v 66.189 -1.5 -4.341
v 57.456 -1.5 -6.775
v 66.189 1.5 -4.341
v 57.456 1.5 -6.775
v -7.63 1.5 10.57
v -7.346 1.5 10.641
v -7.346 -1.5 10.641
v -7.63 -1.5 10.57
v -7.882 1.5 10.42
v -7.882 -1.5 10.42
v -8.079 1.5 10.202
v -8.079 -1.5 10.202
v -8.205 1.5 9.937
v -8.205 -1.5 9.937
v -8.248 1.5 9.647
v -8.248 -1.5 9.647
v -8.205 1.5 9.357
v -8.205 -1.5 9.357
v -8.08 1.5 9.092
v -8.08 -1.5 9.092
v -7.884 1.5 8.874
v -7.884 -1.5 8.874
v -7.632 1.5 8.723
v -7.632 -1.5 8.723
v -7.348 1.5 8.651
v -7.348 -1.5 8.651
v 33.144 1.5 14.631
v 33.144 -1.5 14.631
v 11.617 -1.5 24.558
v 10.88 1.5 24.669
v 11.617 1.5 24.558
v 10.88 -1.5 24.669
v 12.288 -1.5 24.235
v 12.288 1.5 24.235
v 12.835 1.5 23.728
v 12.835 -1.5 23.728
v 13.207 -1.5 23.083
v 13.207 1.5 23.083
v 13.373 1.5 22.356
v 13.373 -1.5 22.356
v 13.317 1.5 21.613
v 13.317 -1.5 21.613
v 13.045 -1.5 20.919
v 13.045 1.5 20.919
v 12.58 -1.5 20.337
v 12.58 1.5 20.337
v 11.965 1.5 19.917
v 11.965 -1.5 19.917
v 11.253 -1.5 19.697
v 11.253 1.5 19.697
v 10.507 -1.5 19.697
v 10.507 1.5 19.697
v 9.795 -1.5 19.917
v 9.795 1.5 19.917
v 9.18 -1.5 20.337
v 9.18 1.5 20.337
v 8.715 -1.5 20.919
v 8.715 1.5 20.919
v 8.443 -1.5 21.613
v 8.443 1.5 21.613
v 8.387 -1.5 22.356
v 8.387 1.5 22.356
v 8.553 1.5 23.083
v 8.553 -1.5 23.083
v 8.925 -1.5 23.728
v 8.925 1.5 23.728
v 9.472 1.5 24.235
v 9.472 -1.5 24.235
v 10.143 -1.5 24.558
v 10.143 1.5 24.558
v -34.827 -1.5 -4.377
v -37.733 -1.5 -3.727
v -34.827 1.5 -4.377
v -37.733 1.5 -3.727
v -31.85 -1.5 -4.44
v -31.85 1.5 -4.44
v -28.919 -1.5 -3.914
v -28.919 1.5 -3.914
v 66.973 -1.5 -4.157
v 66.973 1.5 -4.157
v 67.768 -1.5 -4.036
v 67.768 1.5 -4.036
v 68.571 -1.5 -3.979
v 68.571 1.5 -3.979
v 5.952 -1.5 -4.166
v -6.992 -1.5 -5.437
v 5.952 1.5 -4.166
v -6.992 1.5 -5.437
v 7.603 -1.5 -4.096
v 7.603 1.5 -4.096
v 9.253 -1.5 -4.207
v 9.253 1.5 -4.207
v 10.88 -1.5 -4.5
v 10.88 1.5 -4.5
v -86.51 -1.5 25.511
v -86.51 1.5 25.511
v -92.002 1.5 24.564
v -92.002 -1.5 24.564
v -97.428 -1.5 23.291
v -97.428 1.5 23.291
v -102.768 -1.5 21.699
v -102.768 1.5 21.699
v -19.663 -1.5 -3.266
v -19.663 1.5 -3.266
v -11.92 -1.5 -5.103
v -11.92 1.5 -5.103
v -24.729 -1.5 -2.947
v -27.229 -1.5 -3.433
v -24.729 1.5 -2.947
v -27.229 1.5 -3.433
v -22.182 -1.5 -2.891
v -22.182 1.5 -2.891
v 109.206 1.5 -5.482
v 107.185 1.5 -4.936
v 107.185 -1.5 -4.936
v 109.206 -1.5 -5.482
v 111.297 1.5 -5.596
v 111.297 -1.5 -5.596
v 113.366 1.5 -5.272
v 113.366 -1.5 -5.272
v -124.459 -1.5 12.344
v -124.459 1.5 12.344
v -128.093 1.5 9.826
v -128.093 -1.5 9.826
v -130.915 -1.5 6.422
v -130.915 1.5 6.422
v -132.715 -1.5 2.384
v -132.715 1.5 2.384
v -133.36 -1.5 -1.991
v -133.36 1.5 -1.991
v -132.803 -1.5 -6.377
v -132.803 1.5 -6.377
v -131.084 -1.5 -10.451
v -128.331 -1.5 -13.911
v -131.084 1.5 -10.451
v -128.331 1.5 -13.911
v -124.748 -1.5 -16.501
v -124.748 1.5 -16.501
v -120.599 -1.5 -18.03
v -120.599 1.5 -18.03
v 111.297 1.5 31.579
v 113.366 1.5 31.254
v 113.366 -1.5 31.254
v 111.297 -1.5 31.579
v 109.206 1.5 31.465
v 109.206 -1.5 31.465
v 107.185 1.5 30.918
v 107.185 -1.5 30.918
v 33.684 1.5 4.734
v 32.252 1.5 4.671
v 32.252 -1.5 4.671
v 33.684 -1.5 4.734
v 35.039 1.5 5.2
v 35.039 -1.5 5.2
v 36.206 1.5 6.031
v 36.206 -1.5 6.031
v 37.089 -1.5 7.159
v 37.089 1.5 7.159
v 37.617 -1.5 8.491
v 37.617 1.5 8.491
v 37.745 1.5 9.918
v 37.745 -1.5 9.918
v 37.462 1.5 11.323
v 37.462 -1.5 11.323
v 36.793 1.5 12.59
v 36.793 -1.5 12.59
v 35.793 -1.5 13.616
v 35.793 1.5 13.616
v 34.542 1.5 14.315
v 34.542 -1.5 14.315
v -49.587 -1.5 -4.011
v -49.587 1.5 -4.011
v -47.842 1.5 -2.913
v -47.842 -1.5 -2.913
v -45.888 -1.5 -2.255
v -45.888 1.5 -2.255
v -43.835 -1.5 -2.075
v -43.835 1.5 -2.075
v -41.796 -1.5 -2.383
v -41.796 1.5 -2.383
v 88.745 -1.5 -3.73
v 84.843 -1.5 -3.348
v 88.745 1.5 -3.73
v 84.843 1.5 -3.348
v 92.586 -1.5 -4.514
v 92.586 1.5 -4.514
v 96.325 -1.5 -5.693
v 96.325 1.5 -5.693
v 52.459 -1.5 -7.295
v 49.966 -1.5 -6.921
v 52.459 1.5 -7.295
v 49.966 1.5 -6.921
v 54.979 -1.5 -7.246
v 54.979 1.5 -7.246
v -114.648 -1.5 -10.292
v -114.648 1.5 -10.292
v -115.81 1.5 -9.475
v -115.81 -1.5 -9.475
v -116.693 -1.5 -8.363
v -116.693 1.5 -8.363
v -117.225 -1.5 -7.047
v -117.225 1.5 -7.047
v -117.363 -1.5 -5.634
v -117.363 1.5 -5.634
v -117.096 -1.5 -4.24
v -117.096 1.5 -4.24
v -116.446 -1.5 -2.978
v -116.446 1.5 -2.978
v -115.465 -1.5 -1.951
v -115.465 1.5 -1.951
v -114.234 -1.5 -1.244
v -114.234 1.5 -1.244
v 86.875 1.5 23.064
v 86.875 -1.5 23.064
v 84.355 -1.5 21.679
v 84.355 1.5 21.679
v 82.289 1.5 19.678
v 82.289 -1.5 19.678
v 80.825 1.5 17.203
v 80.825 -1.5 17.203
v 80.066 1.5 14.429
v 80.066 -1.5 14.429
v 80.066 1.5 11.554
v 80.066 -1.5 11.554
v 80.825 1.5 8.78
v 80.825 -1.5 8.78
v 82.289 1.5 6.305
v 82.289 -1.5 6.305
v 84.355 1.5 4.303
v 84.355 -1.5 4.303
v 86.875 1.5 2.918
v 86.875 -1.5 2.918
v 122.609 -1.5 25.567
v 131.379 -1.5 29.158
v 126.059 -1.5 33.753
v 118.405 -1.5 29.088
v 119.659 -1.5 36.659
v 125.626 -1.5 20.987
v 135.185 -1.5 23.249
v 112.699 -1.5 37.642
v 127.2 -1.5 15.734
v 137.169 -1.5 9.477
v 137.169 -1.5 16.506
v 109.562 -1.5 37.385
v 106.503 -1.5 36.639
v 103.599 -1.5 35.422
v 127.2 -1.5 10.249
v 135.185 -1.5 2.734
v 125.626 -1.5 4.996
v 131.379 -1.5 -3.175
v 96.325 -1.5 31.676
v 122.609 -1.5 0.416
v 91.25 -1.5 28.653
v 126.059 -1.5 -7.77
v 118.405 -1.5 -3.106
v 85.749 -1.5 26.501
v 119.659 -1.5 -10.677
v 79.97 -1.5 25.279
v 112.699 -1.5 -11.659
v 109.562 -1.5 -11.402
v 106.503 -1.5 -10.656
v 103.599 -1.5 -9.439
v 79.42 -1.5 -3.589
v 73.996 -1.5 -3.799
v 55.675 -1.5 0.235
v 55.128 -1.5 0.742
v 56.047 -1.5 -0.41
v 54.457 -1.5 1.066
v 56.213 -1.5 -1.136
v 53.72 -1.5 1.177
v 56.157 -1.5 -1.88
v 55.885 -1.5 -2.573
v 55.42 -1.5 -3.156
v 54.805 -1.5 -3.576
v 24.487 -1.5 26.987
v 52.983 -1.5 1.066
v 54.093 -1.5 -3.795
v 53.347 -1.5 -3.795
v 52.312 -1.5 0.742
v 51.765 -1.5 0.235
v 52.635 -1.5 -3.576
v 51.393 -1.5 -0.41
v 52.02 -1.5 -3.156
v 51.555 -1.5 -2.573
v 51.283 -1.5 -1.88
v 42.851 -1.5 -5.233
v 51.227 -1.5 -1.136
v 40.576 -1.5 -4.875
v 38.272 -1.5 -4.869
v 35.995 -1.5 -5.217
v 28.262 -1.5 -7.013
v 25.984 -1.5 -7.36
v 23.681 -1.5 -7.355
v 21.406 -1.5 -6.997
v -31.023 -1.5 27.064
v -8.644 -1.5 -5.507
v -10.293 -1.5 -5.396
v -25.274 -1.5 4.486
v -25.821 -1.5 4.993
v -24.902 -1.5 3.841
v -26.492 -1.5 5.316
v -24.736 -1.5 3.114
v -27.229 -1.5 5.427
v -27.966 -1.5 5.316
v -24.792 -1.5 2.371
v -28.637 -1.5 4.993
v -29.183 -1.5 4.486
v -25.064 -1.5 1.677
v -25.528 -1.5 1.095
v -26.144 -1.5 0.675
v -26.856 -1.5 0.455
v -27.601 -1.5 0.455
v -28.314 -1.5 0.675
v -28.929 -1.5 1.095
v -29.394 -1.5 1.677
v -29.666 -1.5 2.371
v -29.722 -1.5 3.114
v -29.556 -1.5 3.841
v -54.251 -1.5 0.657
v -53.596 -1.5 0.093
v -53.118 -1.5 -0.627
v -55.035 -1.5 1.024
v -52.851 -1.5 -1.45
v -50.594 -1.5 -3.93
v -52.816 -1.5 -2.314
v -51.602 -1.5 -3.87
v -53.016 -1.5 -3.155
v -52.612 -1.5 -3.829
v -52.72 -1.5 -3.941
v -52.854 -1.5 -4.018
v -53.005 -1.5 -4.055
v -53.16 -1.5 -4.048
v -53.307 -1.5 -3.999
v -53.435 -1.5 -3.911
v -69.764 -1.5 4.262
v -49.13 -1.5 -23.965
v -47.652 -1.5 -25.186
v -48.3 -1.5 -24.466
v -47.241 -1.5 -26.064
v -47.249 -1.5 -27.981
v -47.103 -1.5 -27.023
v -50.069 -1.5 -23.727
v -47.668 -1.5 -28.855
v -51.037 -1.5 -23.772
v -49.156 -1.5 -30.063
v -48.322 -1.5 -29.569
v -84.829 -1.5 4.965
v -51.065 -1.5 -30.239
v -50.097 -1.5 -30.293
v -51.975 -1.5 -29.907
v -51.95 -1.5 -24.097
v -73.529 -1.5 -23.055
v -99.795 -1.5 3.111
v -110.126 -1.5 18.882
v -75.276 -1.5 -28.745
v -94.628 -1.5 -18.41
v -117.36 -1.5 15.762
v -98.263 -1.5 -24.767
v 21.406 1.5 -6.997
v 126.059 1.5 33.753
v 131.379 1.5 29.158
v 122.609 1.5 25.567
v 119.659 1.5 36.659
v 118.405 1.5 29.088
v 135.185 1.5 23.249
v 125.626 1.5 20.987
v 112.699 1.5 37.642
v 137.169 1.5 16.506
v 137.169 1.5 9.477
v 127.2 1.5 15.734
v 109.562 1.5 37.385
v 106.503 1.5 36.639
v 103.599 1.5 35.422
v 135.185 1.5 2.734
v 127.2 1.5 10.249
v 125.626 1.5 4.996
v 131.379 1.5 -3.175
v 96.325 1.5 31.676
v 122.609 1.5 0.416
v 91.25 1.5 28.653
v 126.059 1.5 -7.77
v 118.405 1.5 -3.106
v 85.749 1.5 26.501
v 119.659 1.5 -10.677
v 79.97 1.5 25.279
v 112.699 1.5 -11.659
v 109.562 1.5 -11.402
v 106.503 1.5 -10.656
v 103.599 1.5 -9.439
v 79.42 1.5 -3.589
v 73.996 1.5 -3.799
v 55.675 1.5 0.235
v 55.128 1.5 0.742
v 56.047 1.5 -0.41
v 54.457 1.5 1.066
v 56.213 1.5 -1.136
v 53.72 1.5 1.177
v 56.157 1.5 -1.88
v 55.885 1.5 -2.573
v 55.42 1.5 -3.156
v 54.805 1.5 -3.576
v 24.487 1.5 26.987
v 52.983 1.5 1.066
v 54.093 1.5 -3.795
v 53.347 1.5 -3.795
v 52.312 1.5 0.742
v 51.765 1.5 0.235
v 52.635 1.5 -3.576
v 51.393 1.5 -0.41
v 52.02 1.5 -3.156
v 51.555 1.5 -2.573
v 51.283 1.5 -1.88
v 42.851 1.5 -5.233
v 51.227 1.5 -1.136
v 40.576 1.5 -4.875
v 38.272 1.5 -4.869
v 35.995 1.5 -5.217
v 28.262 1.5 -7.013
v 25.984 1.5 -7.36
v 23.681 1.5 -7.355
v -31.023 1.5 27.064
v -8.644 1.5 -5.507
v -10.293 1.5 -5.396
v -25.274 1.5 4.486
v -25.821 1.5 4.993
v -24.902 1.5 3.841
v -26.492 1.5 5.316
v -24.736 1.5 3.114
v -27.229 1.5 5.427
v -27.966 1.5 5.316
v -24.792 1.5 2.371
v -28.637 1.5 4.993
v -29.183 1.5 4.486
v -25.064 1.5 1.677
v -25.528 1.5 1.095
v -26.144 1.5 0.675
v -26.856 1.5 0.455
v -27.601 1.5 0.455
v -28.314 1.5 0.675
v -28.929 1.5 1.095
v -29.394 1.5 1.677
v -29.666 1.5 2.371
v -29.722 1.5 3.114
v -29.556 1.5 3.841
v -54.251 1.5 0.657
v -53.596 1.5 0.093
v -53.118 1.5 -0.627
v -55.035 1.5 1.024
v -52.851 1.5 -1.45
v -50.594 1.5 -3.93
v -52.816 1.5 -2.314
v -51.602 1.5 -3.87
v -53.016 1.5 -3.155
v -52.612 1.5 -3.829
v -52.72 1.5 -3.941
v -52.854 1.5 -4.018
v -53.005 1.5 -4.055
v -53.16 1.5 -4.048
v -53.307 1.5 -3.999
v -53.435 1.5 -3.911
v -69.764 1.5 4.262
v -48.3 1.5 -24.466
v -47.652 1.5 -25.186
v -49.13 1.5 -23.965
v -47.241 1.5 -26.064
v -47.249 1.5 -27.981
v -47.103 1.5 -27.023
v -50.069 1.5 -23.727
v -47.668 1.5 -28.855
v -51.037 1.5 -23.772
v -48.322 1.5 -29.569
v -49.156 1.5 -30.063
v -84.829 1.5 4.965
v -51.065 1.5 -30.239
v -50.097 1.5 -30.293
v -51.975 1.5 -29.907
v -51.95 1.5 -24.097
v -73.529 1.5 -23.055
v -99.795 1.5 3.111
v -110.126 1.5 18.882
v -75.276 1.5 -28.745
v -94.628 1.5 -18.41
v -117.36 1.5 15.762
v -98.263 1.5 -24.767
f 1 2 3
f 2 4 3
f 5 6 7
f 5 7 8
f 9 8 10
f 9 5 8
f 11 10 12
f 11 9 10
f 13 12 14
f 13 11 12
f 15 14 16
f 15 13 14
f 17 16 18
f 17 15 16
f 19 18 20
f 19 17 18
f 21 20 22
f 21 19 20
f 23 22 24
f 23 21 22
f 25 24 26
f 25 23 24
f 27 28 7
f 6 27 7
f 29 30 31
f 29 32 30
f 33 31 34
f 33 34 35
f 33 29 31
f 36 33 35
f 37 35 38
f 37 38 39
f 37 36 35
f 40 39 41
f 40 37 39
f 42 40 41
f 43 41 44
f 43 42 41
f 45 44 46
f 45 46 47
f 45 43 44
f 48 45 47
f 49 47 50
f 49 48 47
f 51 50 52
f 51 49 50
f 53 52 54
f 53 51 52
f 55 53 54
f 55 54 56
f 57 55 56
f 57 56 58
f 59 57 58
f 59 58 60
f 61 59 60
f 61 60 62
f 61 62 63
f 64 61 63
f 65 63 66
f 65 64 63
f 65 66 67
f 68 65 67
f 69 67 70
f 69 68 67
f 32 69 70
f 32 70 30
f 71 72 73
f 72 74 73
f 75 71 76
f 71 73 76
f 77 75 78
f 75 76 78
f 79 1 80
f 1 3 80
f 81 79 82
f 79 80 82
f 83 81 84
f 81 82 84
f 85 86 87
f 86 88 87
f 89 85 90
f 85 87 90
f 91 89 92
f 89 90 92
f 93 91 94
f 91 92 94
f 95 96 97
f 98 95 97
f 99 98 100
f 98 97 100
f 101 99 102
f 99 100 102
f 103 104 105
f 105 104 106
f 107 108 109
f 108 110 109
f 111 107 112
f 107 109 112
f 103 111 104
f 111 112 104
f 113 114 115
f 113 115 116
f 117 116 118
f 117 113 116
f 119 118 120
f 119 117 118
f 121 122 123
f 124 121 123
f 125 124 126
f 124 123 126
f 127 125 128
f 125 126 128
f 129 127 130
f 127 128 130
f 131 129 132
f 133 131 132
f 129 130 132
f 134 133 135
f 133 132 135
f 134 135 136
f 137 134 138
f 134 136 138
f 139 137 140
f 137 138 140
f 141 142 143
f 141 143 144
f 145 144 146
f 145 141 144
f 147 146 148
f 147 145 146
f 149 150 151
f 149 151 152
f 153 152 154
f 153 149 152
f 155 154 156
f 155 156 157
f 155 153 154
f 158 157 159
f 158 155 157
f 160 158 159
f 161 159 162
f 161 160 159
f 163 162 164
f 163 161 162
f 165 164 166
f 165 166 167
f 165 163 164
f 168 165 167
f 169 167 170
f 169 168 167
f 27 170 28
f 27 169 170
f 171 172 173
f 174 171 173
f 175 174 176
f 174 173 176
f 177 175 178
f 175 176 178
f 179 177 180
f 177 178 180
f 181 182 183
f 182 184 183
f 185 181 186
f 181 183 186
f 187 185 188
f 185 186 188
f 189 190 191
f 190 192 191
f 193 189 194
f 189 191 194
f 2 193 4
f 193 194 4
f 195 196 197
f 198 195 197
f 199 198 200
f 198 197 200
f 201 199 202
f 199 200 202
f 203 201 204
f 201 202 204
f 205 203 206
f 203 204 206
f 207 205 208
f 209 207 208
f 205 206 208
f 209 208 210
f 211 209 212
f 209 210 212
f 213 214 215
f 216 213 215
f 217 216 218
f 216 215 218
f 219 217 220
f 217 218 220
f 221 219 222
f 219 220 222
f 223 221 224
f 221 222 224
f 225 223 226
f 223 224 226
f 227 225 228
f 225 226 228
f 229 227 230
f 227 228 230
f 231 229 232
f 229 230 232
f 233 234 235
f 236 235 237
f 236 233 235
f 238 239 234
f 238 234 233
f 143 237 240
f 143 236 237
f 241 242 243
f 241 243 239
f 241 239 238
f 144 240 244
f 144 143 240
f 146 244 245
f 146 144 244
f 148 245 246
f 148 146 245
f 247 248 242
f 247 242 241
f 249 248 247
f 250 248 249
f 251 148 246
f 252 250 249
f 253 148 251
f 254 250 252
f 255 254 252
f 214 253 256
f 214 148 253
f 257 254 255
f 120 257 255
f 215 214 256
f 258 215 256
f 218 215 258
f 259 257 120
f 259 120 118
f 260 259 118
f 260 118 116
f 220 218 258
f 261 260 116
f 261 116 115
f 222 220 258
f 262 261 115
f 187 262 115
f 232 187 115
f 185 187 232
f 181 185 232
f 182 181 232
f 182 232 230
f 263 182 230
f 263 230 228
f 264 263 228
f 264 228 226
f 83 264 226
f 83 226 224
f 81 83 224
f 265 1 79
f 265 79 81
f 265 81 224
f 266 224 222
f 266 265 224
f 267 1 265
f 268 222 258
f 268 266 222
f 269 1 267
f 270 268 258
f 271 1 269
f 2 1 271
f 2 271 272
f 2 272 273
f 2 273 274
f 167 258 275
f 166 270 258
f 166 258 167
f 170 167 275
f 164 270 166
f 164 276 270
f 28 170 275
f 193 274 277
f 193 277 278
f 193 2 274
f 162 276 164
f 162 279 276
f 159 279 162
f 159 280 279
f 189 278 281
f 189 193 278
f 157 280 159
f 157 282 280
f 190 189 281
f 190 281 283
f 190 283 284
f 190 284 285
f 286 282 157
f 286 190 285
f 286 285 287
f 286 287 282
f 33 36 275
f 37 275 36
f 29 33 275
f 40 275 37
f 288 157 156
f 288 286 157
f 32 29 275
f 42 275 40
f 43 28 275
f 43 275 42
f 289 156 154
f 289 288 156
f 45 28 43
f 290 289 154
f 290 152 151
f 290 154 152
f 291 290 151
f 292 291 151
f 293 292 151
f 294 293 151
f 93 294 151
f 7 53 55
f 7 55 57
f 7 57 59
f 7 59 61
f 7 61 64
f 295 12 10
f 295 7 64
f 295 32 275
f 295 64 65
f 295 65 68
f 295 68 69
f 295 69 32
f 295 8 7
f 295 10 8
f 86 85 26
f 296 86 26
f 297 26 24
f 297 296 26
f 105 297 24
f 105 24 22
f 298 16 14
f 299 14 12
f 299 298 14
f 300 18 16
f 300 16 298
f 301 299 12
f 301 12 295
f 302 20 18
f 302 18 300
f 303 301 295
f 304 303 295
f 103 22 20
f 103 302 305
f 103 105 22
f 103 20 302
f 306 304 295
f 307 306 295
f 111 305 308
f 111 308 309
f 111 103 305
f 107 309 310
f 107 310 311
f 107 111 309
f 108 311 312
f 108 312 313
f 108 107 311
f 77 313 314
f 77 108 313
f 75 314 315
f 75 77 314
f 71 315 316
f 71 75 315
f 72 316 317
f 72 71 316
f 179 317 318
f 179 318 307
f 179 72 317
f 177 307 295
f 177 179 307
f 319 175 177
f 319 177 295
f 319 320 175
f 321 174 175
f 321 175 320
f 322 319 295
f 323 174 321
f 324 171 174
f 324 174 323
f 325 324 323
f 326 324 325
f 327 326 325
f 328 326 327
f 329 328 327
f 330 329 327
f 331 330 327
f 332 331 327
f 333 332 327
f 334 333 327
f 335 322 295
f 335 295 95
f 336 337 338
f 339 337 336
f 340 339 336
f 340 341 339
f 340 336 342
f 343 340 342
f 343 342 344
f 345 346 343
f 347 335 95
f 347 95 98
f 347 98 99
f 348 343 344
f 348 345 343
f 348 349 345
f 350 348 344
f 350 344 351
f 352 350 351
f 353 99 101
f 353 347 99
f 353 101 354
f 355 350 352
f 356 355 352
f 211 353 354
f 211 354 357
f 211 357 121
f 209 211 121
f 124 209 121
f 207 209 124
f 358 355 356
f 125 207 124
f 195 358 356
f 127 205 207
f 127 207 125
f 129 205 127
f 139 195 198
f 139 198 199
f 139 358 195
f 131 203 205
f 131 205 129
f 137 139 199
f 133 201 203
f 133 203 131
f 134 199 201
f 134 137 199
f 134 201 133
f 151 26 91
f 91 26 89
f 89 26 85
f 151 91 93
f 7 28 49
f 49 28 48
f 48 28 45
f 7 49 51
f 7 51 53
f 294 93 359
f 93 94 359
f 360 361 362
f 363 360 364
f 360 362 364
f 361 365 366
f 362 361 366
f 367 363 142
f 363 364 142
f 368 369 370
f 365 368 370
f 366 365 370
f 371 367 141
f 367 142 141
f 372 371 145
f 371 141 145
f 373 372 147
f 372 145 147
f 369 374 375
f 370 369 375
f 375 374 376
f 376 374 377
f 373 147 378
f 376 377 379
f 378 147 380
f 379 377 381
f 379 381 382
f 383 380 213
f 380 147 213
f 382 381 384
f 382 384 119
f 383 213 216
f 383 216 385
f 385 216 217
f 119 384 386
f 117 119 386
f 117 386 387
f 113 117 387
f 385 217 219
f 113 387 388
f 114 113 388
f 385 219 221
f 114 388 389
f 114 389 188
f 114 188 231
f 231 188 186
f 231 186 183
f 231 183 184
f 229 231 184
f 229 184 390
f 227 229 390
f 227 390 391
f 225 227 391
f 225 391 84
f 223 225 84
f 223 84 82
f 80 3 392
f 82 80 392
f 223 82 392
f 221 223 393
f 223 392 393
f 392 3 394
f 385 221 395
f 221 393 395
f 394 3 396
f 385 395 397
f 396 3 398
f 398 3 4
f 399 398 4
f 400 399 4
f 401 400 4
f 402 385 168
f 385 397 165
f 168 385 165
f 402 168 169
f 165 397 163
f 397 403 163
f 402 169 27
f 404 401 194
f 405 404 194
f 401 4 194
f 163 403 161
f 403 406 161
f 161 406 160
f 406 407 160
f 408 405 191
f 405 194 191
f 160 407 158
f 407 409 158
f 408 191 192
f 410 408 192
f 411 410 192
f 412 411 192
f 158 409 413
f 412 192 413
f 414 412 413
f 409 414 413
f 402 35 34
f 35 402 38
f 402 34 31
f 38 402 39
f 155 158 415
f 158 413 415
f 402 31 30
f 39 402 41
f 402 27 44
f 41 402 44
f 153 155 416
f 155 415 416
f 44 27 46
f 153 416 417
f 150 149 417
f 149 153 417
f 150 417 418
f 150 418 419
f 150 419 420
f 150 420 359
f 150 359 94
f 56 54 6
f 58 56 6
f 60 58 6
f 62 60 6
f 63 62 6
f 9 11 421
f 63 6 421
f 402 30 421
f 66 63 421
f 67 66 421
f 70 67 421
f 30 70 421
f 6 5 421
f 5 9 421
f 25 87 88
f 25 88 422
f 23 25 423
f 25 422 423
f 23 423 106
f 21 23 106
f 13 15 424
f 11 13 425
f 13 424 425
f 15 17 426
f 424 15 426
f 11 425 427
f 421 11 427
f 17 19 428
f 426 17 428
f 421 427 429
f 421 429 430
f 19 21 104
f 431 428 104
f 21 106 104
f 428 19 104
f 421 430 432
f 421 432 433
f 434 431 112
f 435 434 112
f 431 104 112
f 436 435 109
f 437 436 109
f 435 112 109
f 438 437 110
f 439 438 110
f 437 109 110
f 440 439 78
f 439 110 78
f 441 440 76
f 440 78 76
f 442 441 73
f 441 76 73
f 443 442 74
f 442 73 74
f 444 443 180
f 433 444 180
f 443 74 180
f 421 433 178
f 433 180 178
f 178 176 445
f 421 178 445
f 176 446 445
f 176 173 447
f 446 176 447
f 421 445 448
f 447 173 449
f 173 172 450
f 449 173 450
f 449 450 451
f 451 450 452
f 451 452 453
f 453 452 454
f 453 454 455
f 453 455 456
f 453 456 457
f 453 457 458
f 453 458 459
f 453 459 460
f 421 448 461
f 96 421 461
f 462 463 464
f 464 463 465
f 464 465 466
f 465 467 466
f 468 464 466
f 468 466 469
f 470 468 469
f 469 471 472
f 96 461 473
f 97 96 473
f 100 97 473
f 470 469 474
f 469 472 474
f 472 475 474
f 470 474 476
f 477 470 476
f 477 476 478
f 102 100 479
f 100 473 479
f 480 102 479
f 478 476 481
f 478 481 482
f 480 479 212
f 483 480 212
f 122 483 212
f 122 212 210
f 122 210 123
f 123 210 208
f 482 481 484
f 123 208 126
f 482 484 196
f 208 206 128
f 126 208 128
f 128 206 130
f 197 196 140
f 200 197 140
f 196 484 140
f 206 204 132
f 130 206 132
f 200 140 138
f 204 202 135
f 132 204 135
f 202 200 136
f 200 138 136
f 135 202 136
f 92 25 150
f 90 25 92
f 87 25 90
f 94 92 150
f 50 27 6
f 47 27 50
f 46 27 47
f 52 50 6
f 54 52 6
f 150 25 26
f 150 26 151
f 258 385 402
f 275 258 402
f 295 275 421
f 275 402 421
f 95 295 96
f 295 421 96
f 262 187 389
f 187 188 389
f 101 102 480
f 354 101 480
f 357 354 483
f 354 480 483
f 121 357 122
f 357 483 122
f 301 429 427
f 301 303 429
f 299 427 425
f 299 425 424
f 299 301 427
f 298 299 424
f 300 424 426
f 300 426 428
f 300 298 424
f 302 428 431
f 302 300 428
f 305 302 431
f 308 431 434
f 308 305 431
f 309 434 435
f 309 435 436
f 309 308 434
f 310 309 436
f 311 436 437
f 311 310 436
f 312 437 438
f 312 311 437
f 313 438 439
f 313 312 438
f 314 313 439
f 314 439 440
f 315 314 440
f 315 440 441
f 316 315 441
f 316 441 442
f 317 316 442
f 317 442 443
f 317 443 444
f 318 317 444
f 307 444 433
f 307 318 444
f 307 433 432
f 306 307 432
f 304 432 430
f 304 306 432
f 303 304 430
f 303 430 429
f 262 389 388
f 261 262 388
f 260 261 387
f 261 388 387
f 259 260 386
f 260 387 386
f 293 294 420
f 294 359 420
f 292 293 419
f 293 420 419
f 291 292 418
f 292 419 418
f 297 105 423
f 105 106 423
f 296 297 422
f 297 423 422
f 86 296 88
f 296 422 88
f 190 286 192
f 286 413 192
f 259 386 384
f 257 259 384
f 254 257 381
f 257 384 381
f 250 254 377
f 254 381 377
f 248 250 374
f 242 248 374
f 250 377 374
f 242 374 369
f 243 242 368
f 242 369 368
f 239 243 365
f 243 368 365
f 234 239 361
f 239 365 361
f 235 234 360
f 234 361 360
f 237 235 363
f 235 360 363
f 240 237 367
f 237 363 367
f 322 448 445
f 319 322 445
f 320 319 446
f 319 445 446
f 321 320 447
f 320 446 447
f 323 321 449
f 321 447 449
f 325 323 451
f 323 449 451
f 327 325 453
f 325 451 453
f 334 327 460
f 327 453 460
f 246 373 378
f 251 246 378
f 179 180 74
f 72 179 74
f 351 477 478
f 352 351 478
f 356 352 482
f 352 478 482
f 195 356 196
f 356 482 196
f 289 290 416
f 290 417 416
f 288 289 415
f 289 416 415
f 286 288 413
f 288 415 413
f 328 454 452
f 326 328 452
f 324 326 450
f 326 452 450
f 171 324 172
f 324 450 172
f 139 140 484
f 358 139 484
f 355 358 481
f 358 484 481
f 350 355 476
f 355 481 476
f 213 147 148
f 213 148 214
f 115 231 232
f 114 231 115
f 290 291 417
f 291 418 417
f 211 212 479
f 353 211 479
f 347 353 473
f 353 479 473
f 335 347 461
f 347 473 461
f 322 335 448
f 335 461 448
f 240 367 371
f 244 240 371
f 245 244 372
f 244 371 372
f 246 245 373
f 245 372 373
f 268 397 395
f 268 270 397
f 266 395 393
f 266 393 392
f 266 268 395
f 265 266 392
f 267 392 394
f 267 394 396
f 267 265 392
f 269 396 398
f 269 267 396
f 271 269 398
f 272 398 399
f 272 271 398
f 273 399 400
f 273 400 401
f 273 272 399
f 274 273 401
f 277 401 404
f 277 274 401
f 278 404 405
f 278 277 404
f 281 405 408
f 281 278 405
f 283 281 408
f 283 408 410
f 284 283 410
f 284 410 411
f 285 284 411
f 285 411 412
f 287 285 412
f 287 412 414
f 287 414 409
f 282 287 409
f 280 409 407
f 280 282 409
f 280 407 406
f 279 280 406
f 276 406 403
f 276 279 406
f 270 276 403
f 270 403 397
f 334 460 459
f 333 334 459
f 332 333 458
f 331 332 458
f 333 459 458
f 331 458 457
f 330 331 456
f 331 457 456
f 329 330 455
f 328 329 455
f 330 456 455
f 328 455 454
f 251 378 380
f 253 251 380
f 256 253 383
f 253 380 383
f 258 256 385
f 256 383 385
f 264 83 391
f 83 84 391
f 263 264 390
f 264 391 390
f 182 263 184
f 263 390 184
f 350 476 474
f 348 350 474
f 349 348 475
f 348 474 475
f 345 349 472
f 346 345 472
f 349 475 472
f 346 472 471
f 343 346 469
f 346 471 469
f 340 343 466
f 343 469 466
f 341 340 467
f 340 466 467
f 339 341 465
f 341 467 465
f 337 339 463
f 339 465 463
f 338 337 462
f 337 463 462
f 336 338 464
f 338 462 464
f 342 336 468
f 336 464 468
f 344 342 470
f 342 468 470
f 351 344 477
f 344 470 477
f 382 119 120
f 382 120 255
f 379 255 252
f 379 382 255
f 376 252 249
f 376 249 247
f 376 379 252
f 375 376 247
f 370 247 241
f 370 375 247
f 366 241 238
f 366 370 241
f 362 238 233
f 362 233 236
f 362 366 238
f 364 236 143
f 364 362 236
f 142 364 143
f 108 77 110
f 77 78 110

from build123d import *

# Parameters (mm, degrees)
SKETCH1_R           = 2.4999999999999987
SKETCH1_R_2         = 2.4999999999999996
SKETCH1_R_3         = 2.4999999988368367
BOSS_EXTRUDE1_DEPTH = 1.5


with BuildPart() as part:
    # Sketch1 → Boss-Extrude1 (new, symmetric)
    with BuildSketch(Plane(origin=(0, 0, 0), x_dir=(1, 0, 0), z_dir=(0, 1, 0))):
        with BuildLine():
            Line((-41.79617581077867, 2.382798182125341), (-37.73330547981784, 3.726907894077695))
            ThreePointArc((-37.73330547981784, 3.726907894077695), (-33.34023665036322, 4.48261370370704), (-28.919065231416493, 3.9139413064841877))
            Line((-28.919065231416493, 3.9139413064841877), (-27.228879505558364, 3.4332944614597887))
            ThreePointArc((-27.228879505558364, 3.4332944614597887), (-23.456808752947794, 2.864896052239951), (-19.663338722278937, 3.26636789523878))
            Line((-19.663338722278937, 3.26636789523878), (-11.919945267506879, 5.103463979240285))
            ThreePointArc((-11.919945267506879, 5.103463979240285), (-9.469729211186351, 5.474383326712289), (-6.991881476316525, 5.436826865477882))
            Line((-6.991881476316525, 5.436826865477882), (5.951872192796172, 4.166165679329836))
            ThreePointArc((5.951872192796172, 4.166165679329836), (8.429719927543827, 4.128609218087167), (10.879935983748245, 4.499528565510892))
            Line((10.879935983748245, 4.499528565510892), (21.40551753025073, 6.996690146393965))
            ThreePointArc((21.40551753025073, 6.996690146393965), (24.83264502259487, 7.401769909560215), (28.261649532088523, 7.012899060487261))
            Line((28.261649532088523, 7.012899060487261), (35.99495155066682, 5.216777544396412))
            ThreePointArc((35.99495155066682, 5.216777544396412), (39.42395606023976, 4.82790669529539), (42.85108355268613, 5.232986458392139))
            Line((42.85108355268613, 5.232986458392139), (49.96600006451842, 6.920978336659753))
            ThreePointArc((49.96600006451842, 6.920978336659753), (53.72001531855511, 7.32326878816774), (57.455567828585835, 6.77544073145873))
            Line((57.455567828585835, 6.77544073145873), (66.18925821321116, 4.3413933248153))
            ThreePointArc((66.18925821321116, 4.3413933248153), (67.36926268792493, 4.088133405140102), (68.57118312482231, 3.9788703710124524))
            ThreePointArc((68.57118312482231, 3.9788703710124524), (76.70834195009273, 3.69798054493333), (84.84283443476778, 3.3482880245078643))
            ThreePointArc((84.84283443476778, 3.3482880245078643), (90.6755684371097, 4.07235098588054), (96.32527960365518, 5.692788225862035))
            Line((96.32527960365518, 5.692788225862035), (103.59933222252589, 9.439170279671533))
            ThreePointArc((103.59933222252589, 9.439170279671533), (108.01760653283236, 11.089221722684941), (112.69942544373606, 11.658773591445987))
            ThreePointArc((112.69942544373606, 11.658773591445987), (137.42059205461962, -12.991414338135115), (112.69942544373606, -37.64160226771621))
            ThreePointArc((112.69942544373606, -37.64160226771621), (108.01760653283236, -37.07205039895516), (103.59933222252589, -35.42199895594175))
            Line((103.59933222252589, -35.42199895594175), (96.32527960365518, -31.675616902132255))
            ThreePointArc((96.32527960365518, -31.675616902132255), (88.5441551766424, -27.463864954095598), (79.9703022290949, -25.278962792836175))
            ThreePointArc((79.9703022290949, -25.278962792836175), (-3.2675277579170765, -27.22969716665807), (-86.51046185027334, -25.510502808965498))
            ThreePointArc((-86.51046185027334, -25.510502808965498), (-94.72463382860796, -23.967931939620144), (-102.76843470025015, -21.698699973958888))
            ThreePointArc((-102.76843470025015, -21.698699973958888), (-113.75910937557403, -17.35916690176714), (-124.45852861685042, -12.344298508393459))
            ThreePointArc((-124.45852861685042, -12.344298508393459), (-133.23144555995484, 4.202899533030633), (-120.59919444516926, 18.030410751095733))
            ThreePointArc((-120.59919444516926, 18.030410751095733), (-86.83004932052131, 27.105129355217315), (-51.97527685246112, 29.907006653257785))
            ThreePointArc((-51.97527685246112, 29.907006653257785), (-47.10250450667497, 27.022733824765), (-51.95035427562549, 24.096765147433302))
            ThreePointArc((-51.95035427562549, 24.096765147433302), (-84.17625346987383, 21.176955554132093), (-114.64829350025539, 10.291706667413088))
            ThreePointArc((-114.64829350025539, 10.291706667413088), (-117.36336095050851, 5.634125667179891), (-114.23380520696547, 1.244304158141715))
            ThreePointArc((-114.23380520696547, 1.244304158141715), (-84.82863856721416, -4.964735101077579), (-55.03457582625992, -1.023945964096185))
            ThreePointArc((-55.03457582625992, -1.023945964096185), (-52.956149124988286, 1.029337853892025), (-53.43468142437476, 3.9114965636467445))
            ThreePointArc((-53.43468142437476, 3.9114965636467445), (-53.00487930043318, 4.054737535668091), (-52.611913679317254, 3.829291616670397))
            ThreePointArc((-52.611913679317254, 3.829291616670397), (-51.09811473462323, 3.897658149961778), (-49.58701407449473, 4.010954322846273))
            ThreePointArc((-49.58701407449473, 4.010954322846273), (-45.88836824044927, 2.255302591622458), (-41.79617581077867, 2.382798182125341))
        make_face()
        with Locations(Location((-27.228879503846553, -2.927214905609624, 0), (0, 0, 270))):
            Circle(SKETCH1_R, mode=Mode.SUBTRACT)
        with Locations(Location((10.879935983748245, -22.16932690789429, 0), (0, 0, 270))):
            Circle(SKETCH1_R_2, mode=Mode.SUBTRACT)
        with Locations(Location((53.72001531851656, 1.3232687879424379, 0), (0, 0, 270))):
            Circle(SKETCH1_R_3, mode=Mode.SUBTRACT)
        with BuildLine():
            Line((-7.347962122783413, -8.651271752579847), (32.25203787721659, -4.6713220041533745))
            ThreePointArc((32.25203787721659, -4.6713220041533745), (37.73209037371569, -9.200078584871521), (33.1443469248767, -14.630844790428428))
            Line((33.1443469248767, -14.630844790428428), (-7.346014603537373, -10.64144043499709))
            ThreePointArc((-7.346014603537373, -10.64144043499709), (-8.24796164398419, -9.647237759156878), (-7.347962122783413, -8.651271752579847))
        make_face(mode=Mode.SUBTRACT)
        with BuildLine():
            Line((86.87503313674924, -2.91833741505861), (107.18489994547878, 4.935508738787573))
            ThreePointArc((107.18489994547878, 4.935508738787573), (110.24885192022663, 5.593844362539373), (113.36611131404287, 5.271507010179491))
            ThreePointArc((113.36611131404287, 5.271507010179491), (123.48655350207885, -1.4751872230410612), (127.40034273906164, -12.991414338135112))
            ThreePointArc((127.40034273906164, -12.991414338135112), (123.48655350207883, -24.507641453229162), (113.36611131404287, -31.25433568644971))
            ThreePointArc((113.36611131404287, -31.25433568644971), (110.24885192022663, -31.576673038809595), (107.18489994547878, -30.9183374150578))
            Line((107.18489994547878, -30.9183374150578), (86.87503313674924, -23.064491261211614))
            ThreePointArc((86.87503313674924, -23.064491261211614), (81.86219058303507, -19.097603567215177), (79.9703022290949, -12.991414338135112))
            ThreePointArc((79.9703022290949, -12.991414338135112), (81.86219058303507, -6.8852251090550425), (86.87503313674924, -2.91833741505861))
        make_face(mode=Mode.SUBTRACT)
    extrude(amount=BOSS_EXTRUDE1_DEPTH, both=True)


solid = part.part
